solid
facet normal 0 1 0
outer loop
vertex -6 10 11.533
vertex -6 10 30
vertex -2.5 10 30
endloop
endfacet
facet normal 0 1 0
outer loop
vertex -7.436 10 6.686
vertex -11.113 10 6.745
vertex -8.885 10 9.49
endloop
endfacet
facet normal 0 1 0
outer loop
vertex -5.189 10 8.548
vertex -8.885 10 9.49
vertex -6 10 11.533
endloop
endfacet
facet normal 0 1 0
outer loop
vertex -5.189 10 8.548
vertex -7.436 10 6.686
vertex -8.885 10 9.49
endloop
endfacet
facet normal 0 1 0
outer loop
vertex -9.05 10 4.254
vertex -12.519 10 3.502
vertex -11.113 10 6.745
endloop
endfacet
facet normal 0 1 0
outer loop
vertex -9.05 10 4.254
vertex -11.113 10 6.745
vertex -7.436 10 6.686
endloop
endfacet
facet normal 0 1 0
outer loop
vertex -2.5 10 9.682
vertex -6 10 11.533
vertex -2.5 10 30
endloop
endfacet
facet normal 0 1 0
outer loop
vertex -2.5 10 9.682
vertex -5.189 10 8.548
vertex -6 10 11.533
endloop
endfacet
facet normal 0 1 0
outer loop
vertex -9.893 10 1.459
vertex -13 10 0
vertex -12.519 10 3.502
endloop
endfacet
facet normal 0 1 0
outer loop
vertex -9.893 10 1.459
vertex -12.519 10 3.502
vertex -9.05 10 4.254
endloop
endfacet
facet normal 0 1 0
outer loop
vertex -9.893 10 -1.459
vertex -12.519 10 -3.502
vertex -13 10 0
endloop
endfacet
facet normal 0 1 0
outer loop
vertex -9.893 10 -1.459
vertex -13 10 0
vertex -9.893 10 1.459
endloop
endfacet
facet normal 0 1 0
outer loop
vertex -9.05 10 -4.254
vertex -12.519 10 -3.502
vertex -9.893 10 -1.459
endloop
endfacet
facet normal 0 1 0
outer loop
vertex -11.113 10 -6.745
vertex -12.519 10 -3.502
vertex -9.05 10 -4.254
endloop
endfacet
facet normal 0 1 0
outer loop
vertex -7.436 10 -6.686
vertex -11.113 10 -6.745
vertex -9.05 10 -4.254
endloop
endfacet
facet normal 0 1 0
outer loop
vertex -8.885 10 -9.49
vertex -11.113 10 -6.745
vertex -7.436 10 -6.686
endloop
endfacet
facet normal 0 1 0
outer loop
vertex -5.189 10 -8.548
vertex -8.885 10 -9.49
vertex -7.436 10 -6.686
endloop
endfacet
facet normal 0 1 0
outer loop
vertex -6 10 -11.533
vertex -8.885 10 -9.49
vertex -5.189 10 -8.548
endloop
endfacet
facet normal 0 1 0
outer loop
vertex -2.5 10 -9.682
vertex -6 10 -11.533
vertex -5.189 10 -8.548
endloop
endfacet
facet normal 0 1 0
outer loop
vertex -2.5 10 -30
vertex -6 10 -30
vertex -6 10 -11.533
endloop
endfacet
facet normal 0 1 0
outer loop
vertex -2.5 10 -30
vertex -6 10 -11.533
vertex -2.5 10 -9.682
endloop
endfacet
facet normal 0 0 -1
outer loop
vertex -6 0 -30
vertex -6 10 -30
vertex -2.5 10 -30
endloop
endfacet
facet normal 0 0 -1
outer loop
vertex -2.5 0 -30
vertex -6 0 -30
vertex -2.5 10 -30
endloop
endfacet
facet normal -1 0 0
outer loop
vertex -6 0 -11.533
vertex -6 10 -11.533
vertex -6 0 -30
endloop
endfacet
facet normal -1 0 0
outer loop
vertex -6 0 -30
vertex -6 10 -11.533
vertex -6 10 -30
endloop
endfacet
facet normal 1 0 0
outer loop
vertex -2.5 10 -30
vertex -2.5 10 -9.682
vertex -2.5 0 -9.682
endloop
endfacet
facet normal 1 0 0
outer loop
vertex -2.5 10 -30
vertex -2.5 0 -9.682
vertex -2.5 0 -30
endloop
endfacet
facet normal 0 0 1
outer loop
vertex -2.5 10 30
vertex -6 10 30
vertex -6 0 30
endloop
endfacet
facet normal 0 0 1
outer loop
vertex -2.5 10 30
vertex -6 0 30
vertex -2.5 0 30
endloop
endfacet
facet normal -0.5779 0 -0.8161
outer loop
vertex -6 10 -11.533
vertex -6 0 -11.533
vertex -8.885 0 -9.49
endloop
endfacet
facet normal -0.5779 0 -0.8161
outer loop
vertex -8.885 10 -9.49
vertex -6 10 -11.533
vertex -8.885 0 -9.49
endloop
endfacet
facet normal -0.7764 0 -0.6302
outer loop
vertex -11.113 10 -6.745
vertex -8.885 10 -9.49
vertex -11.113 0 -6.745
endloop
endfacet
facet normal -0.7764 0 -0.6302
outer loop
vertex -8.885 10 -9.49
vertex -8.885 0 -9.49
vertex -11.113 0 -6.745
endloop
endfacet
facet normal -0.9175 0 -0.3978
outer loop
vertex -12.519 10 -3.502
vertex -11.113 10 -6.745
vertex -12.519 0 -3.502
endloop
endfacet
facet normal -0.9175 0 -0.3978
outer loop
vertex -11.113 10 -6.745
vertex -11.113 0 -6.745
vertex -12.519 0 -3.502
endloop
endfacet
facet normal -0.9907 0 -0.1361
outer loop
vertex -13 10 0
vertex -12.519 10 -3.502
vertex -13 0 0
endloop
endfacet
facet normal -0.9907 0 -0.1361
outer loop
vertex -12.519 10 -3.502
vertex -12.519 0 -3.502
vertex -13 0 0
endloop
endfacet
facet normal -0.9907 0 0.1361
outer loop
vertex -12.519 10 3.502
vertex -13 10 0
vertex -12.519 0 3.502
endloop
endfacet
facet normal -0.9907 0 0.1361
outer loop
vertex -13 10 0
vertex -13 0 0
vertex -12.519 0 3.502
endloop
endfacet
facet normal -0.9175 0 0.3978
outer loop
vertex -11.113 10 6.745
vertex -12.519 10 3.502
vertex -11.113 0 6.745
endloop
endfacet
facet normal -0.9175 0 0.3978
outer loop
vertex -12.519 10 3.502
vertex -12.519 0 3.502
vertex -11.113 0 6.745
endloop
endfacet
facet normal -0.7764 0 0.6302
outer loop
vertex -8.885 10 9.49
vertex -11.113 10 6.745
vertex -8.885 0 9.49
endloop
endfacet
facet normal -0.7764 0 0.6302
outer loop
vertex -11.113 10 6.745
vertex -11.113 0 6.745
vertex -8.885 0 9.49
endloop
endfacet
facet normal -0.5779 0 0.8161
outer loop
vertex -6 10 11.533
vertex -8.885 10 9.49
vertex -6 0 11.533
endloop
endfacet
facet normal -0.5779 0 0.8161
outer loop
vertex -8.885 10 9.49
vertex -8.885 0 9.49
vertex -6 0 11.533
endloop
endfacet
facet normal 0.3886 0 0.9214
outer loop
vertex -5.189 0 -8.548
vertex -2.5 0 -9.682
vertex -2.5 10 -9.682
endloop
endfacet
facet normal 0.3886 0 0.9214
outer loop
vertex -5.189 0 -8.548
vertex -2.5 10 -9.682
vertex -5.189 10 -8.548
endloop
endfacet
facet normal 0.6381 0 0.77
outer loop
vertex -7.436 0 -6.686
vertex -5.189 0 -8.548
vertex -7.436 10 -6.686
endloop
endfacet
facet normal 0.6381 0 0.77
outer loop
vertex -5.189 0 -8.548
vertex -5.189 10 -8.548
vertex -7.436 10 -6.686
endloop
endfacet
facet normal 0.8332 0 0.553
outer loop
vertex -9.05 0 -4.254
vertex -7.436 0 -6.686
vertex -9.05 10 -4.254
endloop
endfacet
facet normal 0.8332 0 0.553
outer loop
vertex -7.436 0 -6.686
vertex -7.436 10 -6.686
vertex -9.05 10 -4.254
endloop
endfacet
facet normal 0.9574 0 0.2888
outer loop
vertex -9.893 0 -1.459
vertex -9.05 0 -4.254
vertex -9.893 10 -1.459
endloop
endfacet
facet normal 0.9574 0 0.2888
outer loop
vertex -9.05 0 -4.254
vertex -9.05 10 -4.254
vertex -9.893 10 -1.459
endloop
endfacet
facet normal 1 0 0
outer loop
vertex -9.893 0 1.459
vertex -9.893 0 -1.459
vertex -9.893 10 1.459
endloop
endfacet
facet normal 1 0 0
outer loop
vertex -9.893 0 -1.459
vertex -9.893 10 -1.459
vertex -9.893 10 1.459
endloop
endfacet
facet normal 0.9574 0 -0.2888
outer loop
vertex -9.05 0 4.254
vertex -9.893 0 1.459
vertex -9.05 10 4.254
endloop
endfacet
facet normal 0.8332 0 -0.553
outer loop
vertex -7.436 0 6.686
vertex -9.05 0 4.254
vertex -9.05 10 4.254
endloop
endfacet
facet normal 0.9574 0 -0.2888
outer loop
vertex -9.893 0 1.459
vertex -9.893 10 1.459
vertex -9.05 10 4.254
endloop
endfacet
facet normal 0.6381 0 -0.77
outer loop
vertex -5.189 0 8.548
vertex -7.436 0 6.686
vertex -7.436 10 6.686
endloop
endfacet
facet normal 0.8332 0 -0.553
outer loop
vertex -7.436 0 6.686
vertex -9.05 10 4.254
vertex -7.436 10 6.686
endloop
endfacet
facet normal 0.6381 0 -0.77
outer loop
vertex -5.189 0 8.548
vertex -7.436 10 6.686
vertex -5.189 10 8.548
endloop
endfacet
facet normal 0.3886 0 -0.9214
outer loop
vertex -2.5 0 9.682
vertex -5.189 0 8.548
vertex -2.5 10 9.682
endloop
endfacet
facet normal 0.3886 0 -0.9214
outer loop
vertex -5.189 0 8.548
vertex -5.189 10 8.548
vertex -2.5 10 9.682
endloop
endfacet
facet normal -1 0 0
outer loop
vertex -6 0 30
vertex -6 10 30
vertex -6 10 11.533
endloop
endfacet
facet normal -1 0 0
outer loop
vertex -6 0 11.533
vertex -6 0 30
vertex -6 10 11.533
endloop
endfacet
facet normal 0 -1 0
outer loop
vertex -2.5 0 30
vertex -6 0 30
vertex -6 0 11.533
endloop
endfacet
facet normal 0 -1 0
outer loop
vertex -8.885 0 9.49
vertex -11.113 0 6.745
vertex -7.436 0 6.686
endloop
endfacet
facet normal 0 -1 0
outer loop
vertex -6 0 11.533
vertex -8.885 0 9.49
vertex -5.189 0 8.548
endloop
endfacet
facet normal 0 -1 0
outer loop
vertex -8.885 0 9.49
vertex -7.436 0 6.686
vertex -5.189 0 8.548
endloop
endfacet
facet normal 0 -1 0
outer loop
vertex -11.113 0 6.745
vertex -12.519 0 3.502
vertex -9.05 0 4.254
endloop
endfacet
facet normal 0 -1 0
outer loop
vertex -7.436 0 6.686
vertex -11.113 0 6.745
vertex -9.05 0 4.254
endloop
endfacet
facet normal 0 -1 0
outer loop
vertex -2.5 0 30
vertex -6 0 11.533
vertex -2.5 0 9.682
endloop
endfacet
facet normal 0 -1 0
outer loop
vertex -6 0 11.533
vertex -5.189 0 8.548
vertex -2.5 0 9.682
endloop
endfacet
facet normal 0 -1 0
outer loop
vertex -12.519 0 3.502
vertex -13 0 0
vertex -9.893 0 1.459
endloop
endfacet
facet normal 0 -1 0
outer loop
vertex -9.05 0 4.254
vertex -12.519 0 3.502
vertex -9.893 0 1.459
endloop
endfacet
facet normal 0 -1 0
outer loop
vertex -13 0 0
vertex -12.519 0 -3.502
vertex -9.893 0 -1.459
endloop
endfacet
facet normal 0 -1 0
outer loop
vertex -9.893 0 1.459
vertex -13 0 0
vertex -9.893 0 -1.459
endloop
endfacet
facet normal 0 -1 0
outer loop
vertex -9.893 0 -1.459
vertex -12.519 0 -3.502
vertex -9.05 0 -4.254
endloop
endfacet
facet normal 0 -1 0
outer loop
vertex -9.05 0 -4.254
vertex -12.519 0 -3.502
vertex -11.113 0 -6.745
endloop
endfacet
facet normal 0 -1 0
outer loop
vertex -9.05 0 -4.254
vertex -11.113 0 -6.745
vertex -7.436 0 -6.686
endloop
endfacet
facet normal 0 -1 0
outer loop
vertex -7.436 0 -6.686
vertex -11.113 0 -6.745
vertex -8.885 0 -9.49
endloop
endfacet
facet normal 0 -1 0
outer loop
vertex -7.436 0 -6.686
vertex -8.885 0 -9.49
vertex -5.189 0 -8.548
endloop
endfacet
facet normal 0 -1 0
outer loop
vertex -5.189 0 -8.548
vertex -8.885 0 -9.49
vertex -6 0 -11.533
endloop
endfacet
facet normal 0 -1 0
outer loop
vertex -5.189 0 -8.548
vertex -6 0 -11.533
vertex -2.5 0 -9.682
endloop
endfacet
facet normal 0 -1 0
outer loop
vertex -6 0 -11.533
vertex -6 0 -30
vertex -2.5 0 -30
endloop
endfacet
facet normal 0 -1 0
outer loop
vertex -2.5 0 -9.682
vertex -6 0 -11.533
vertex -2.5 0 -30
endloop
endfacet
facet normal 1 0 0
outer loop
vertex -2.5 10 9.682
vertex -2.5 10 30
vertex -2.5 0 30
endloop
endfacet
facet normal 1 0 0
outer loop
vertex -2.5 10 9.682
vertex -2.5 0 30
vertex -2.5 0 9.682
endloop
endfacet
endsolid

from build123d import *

# Parameters (mm, degrees)
SKETCH_1_R          = 13
EXTRUDE_1_DEPTH     = 10
SKETCH_2_W          = 12
SKETCH_2_H          = 60
EXTRUDE_2_DEPTH     = 10
SKETCH_3_R          = 10
CUT_EXTRUDE_1_DEPTH = 10
SKETCH_4_W          = 32.688093459
SKETCH_4_H          = 61.579585558
CUT_EXTRUDE_2_DEPTH = 10


with BuildPart() as part:
    # 草图1 → 凸台-拉伸1 (new body)
    with BuildSketch(Plane(origin=(0, 0, 0), x_dir=(1, 0, 0), z_dir=(0, 1, 0))):
        with Locations(Location((0, 0, 0), (0, 0, 270))):
            Circle(SKETCH_1_R)
    extrude(amount=EXTRUDE_1_DEPTH)

    # 草图2 → 凸台-拉伸2 (add)
    with BuildSketch(Plane(origin=(0, 10, 0), x_dir=(1, 0, 0), z_dir=(0, 1, 0))):
        Rectangle(SKETCH_2_W, SKETCH_2_H)
    extrude(amount=-EXTRUDE_2_DEPTH)

    # 草图3 → 切除-拉伸1 (cut)
    with BuildSketch(Plane(origin=(0, 10, 0), x_dir=(1, 0, 0), z_dir=(0, 1, 0))):
        with Locations(Location((0, 0, 0), (0, 0, 270))):
            Circle(SKETCH_3_R)
    extrude(amount=-CUT_EXTRUDE_1_DEPTH, mode=Mode.SUBTRACT)

    # 草图4 → 切除-拉伸2 (cut)
    with BuildSketch(Plane(origin=(0, 10, 0), x_dir=(1, 0, 0), z_dir=(0, 1, 0))):
        with Locations((13.84404673, -0.789792779)):
            Rectangle(SKETCH_4_W, SKETCH_4_H)
    extrude(amount=-CUT_EXTRUDE_2_DEPTH, mode=Mode.SUBTRACT)


solid = part.part
